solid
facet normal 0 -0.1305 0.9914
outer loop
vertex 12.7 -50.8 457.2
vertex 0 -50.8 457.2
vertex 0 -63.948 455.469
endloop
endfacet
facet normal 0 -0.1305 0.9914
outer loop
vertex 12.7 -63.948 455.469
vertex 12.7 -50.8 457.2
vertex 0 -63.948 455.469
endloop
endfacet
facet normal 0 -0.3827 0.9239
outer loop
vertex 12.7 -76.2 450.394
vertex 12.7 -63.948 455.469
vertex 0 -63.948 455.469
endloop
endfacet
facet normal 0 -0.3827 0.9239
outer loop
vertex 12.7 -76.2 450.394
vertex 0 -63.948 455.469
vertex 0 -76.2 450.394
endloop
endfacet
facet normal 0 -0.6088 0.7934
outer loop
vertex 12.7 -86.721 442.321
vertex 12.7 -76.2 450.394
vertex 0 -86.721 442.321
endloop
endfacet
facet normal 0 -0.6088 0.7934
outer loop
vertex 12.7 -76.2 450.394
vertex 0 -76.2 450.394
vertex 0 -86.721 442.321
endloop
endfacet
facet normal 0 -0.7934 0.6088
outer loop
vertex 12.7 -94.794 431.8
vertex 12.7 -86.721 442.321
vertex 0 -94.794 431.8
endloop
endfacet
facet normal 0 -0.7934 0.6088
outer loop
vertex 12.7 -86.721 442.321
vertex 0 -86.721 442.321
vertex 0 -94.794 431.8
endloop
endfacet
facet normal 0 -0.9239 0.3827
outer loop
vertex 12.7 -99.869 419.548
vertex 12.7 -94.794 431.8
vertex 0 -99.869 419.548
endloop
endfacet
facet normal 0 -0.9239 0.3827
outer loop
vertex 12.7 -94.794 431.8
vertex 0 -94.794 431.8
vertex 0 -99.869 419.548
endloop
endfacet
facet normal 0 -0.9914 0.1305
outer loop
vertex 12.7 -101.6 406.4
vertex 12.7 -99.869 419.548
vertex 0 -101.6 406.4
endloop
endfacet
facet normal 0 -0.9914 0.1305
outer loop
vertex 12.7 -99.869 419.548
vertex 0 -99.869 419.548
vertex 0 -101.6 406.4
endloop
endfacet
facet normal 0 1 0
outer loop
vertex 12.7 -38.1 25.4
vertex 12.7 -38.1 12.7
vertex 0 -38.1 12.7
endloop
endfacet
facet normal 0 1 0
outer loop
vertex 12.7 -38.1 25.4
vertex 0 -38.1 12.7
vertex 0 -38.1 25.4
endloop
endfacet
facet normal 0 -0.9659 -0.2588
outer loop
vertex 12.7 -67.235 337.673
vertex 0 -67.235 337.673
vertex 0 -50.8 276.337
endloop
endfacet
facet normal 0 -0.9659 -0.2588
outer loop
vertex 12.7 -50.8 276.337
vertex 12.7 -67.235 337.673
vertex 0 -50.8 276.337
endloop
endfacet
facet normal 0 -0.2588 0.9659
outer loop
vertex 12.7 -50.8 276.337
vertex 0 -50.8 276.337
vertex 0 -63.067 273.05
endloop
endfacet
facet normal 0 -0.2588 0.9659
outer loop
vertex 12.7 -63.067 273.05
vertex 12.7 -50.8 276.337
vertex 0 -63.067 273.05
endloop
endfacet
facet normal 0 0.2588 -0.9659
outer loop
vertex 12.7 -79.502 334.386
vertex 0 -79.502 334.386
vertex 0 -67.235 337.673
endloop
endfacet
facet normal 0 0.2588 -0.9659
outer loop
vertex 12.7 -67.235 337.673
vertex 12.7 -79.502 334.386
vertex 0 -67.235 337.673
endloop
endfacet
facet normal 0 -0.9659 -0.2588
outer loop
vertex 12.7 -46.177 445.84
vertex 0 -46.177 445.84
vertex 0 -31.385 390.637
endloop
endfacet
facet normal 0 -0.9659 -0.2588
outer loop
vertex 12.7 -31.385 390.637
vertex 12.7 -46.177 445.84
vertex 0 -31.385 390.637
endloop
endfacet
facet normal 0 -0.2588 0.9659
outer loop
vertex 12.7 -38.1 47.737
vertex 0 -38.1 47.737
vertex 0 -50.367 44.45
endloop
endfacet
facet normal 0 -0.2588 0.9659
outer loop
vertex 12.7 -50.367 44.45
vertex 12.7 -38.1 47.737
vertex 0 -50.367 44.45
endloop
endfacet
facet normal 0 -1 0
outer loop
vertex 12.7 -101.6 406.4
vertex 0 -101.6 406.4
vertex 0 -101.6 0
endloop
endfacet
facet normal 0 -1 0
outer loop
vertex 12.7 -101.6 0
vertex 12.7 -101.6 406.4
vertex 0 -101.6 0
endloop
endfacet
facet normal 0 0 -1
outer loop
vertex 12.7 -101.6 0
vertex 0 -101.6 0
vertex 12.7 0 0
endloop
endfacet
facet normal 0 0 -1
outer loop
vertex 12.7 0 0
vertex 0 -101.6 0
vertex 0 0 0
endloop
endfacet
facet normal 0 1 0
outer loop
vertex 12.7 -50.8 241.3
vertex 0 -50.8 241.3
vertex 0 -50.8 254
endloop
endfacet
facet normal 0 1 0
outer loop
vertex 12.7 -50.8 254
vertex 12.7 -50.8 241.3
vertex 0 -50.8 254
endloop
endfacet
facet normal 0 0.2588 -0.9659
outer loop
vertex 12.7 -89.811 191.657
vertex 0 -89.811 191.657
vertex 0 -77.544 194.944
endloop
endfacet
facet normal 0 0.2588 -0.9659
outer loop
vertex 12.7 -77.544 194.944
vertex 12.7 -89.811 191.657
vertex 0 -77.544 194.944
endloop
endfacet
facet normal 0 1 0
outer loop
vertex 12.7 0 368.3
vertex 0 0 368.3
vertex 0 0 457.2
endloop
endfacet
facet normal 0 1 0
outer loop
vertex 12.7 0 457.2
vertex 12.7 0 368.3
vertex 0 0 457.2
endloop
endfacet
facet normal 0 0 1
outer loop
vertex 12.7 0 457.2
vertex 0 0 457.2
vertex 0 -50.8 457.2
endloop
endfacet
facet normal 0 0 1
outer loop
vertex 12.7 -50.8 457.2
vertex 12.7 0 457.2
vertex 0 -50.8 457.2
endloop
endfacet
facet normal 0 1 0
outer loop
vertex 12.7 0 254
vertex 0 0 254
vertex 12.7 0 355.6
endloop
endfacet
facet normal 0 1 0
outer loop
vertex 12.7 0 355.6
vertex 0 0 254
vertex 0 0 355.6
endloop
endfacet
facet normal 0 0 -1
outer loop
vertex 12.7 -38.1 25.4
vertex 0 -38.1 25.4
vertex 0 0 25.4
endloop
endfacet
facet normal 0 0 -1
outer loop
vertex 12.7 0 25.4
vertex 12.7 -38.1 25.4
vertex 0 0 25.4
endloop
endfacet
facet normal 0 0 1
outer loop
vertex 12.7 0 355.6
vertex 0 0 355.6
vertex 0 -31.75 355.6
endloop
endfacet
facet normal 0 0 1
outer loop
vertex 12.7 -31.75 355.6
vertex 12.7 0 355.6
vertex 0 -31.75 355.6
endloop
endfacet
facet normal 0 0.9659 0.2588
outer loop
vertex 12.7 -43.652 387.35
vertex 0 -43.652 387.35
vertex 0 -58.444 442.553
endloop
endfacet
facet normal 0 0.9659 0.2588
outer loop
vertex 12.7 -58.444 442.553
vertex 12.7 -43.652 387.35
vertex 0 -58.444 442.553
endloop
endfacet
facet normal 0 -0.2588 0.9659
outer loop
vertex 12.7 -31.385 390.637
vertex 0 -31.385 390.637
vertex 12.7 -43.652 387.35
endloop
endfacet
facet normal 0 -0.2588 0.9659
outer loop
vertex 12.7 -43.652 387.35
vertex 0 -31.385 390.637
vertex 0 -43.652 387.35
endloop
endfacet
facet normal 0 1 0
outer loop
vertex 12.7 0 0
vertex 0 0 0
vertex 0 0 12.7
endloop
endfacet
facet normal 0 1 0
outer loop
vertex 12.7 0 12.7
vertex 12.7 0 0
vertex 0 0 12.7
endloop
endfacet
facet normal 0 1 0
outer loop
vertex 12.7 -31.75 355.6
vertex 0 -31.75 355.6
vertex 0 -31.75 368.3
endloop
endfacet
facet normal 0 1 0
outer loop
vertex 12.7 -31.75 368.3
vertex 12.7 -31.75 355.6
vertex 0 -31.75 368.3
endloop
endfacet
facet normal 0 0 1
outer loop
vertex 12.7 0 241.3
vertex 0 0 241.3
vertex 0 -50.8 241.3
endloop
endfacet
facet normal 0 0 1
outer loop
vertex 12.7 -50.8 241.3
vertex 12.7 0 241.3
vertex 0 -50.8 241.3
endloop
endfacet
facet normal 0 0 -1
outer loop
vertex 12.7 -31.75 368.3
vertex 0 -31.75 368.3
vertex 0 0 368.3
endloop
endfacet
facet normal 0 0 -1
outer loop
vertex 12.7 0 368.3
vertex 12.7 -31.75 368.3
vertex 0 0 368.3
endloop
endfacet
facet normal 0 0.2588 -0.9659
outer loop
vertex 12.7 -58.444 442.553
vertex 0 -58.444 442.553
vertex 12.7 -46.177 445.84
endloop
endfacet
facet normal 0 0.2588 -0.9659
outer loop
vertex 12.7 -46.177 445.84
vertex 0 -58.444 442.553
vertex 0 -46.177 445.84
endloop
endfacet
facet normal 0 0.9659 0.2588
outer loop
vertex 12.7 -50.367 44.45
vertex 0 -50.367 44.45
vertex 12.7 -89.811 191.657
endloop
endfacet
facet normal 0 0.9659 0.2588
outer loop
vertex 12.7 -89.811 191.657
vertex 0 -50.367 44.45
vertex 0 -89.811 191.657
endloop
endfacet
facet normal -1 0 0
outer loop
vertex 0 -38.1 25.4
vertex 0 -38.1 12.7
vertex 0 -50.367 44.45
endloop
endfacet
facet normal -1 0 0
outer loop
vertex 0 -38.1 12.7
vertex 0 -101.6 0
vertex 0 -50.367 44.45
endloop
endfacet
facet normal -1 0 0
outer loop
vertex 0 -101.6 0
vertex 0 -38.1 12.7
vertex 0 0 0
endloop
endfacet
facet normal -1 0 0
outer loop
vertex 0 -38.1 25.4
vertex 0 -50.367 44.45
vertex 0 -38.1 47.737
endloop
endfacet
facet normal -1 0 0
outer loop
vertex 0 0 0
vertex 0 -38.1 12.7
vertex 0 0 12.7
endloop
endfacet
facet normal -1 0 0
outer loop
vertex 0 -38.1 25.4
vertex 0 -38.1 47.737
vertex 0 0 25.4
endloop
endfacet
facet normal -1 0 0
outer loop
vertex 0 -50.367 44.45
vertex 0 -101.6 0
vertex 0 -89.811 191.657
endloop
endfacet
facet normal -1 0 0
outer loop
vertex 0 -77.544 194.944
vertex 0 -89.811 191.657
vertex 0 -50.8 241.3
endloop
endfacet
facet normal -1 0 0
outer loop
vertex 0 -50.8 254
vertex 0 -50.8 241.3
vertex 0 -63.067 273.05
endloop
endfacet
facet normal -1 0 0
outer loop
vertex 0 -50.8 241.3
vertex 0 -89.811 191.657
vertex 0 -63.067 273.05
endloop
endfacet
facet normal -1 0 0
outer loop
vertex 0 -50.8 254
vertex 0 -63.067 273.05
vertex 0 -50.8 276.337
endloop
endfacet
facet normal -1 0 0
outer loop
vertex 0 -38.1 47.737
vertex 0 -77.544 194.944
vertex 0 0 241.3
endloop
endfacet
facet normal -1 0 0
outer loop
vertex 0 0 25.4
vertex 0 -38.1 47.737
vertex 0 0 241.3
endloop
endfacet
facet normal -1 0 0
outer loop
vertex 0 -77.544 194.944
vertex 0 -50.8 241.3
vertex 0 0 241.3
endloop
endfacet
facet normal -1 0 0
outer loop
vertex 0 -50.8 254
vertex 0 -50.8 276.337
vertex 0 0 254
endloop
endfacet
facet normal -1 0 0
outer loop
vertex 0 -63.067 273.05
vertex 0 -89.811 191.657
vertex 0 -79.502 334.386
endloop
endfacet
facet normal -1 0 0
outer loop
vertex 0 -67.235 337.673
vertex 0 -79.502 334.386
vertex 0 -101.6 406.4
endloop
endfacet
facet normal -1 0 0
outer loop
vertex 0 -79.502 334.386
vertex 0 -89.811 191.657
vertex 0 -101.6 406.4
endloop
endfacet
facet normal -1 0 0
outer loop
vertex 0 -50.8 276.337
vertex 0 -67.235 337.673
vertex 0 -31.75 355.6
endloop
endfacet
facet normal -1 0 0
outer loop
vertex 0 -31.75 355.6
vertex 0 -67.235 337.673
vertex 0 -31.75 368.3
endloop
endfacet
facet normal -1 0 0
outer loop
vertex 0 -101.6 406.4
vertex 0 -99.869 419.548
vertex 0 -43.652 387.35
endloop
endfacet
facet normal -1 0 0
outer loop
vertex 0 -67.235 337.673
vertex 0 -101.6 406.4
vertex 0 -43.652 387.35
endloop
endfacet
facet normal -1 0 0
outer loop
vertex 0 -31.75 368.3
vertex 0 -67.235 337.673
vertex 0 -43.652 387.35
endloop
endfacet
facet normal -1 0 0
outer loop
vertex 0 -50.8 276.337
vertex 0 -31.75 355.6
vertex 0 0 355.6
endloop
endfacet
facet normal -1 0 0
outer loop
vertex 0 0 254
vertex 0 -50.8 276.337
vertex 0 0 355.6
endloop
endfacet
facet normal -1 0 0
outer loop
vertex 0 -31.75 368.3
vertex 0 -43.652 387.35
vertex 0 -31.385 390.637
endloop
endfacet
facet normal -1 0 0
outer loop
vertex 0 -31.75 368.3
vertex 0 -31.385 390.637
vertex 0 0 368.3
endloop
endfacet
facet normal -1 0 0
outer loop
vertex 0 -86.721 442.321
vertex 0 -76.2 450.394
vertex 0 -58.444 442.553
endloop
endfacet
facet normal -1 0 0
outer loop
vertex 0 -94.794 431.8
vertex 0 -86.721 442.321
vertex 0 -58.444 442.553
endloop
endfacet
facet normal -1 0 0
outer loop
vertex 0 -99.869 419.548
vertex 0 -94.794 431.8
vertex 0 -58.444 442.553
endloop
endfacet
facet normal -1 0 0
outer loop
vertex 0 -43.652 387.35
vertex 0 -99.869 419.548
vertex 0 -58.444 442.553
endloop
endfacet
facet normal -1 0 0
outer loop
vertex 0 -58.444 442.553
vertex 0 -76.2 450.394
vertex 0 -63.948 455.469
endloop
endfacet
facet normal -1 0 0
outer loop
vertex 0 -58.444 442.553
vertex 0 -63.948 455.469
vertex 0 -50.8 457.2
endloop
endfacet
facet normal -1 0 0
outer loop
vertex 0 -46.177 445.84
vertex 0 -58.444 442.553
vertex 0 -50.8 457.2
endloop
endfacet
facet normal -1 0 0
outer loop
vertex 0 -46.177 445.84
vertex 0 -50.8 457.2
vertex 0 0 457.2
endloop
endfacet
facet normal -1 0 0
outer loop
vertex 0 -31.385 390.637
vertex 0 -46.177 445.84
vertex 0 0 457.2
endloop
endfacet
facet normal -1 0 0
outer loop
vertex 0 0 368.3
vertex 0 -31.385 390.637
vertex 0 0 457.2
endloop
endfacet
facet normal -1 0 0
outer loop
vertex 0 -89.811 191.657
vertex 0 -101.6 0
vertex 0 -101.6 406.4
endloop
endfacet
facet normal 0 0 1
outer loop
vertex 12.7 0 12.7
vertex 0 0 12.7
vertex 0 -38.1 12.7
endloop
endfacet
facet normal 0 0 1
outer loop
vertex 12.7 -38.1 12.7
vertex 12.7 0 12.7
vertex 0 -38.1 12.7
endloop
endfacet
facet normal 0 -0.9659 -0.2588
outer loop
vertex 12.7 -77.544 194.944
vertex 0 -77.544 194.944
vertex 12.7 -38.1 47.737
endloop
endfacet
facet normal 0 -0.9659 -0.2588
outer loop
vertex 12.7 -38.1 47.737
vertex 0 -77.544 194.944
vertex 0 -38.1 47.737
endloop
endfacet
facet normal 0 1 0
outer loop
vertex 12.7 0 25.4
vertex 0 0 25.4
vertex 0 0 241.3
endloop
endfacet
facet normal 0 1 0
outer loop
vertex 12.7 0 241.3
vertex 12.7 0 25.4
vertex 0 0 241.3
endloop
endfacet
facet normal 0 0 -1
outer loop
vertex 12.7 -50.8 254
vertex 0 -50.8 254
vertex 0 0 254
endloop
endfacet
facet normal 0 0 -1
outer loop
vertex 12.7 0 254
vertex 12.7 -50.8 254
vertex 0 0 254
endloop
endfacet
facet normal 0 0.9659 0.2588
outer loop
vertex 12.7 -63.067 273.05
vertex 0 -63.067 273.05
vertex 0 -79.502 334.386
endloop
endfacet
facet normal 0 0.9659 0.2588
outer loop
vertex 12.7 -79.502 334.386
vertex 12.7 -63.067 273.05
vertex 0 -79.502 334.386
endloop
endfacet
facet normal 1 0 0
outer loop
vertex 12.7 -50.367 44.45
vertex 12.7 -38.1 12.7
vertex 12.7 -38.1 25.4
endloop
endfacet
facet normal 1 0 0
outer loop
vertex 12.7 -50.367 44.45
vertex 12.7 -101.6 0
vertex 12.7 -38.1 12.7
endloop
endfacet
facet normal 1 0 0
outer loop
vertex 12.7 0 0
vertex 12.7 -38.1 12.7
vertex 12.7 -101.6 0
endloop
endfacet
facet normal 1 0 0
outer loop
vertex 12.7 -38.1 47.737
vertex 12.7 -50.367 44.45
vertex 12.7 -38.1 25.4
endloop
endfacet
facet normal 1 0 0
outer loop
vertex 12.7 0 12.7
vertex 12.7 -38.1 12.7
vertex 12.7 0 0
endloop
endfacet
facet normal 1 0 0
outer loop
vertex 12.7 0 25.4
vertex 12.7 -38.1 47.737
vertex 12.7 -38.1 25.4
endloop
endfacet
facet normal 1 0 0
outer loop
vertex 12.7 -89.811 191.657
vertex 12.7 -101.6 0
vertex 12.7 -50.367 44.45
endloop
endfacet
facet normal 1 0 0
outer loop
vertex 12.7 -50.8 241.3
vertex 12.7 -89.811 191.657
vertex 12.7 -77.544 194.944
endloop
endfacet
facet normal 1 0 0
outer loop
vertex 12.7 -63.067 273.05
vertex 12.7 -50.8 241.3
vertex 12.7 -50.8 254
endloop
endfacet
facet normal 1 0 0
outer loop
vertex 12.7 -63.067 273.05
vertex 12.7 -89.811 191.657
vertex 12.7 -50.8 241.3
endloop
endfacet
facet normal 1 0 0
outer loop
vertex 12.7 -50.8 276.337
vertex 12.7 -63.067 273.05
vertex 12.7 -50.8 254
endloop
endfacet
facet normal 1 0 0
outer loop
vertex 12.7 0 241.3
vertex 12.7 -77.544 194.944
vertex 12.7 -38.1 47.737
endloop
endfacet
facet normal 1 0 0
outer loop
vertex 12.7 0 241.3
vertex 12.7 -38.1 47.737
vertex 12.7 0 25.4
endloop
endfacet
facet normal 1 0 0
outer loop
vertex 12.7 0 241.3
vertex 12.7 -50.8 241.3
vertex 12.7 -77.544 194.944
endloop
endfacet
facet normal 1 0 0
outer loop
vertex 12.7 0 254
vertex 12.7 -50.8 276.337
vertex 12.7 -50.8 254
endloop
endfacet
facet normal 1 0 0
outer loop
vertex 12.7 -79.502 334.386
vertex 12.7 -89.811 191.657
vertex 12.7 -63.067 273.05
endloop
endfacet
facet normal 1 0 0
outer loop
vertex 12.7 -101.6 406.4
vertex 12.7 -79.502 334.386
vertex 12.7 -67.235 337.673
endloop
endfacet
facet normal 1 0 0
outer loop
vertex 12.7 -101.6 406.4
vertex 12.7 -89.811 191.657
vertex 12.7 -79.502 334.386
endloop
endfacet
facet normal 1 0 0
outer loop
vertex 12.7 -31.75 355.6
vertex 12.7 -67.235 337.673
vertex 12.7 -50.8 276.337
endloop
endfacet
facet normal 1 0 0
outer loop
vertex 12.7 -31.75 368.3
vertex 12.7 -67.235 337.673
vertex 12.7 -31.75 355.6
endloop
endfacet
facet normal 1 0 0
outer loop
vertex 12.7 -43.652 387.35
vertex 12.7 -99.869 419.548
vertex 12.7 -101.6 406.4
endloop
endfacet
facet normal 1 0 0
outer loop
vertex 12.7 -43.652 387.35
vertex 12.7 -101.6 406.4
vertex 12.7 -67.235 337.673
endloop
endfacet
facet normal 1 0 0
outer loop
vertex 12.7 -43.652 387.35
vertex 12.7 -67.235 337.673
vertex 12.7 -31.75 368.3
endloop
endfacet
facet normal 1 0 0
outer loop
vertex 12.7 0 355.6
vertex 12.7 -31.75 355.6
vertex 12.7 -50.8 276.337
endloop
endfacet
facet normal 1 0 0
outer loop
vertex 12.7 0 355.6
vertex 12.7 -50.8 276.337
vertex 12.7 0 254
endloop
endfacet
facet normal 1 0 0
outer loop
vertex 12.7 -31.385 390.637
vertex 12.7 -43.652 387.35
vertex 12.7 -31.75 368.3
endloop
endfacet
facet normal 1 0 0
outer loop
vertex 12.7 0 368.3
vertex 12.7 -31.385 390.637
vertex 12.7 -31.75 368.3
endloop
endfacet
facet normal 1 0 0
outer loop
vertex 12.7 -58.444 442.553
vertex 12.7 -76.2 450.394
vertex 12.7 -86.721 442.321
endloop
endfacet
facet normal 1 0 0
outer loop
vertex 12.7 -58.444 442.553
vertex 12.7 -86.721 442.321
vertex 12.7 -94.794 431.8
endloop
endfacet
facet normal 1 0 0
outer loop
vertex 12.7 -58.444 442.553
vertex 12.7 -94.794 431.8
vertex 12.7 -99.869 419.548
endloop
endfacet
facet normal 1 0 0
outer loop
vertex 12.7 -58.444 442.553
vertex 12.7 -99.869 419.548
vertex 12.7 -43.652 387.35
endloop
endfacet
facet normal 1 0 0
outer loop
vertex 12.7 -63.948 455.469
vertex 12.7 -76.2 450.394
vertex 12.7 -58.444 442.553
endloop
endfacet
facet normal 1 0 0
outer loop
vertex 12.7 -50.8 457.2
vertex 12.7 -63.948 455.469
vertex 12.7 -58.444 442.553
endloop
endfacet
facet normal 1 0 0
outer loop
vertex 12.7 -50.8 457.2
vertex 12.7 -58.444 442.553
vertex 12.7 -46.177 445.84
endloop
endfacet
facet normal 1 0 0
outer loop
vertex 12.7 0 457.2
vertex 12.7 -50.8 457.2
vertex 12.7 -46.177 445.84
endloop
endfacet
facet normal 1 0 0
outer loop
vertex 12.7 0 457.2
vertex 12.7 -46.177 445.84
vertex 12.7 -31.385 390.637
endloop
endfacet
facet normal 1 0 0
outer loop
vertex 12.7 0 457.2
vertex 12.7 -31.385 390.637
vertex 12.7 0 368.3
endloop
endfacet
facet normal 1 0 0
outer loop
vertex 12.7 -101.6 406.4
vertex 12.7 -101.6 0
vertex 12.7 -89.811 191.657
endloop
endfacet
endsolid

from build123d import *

# Parameters (mm, degrees)
F1_DEPTH = 12.7


with BuildPart() as f1:
    # F0 (on Right) → F1 (new body)
    with BuildSketch(Plane.YZ):
        with BuildLine():
            Line((-101.6, 0), (0, 0))
            Line((0, 0), (0, 12.7))
            Line((0, 12.7), (-38.1, 12.7))
            Line((-38.1, 12.7), (-38.1, 25.4))
            Line((-38.1, 25.4), (0, 25.4))
            Line((0, 25.4), (0, 241.3))
            Line((0, 241.3), (-50.8, 241.3))
            Line((-50.8, 241.3), (-50.8, 254))
            Line((-50.8, 254), (0, 254))
            Line((0, 254), (0, 355.6))
            Line((0, 355.6), (-31.75, 355.6))
            Line((-31.75, 355.6), (-31.75, 368.3))
            Line((-31.75, 368.3), (0, 368.3))
            Line((0, 368.3), (0, 457.2))
            Line((0, 457.2), (-50.8, 457.2))
            ThreePointArc((-50.8, 457.2), (-86.721024, 442.321024), (-101.6, 406.4))
            Line((-101.6, 406.4), (-101.6, 0))
        make_face()
        Polygon((-77.544022, 194.944098), (-38.1, 47.737002), (-50.367258, 44.45), (-89.81128, 191.657096), align=None, mode=Mode.SUBTRACT)
        Polygon((-63.067258, 273.05), (-79.502267, 334.38629), (-67.235009, 337.673292), (-50.8, 276.337002), align=None, mode=Mode.SUBTRACT)
        Polygon((-43.65244, 387.35), (-58.443948, 442.552661), (-46.17669, 445.839663), (-31.385182, 390.637002), align=None, mode=Mode.SUBTRACT)
    extrude(amount=F1_DEPTH)


solid = f1.part
